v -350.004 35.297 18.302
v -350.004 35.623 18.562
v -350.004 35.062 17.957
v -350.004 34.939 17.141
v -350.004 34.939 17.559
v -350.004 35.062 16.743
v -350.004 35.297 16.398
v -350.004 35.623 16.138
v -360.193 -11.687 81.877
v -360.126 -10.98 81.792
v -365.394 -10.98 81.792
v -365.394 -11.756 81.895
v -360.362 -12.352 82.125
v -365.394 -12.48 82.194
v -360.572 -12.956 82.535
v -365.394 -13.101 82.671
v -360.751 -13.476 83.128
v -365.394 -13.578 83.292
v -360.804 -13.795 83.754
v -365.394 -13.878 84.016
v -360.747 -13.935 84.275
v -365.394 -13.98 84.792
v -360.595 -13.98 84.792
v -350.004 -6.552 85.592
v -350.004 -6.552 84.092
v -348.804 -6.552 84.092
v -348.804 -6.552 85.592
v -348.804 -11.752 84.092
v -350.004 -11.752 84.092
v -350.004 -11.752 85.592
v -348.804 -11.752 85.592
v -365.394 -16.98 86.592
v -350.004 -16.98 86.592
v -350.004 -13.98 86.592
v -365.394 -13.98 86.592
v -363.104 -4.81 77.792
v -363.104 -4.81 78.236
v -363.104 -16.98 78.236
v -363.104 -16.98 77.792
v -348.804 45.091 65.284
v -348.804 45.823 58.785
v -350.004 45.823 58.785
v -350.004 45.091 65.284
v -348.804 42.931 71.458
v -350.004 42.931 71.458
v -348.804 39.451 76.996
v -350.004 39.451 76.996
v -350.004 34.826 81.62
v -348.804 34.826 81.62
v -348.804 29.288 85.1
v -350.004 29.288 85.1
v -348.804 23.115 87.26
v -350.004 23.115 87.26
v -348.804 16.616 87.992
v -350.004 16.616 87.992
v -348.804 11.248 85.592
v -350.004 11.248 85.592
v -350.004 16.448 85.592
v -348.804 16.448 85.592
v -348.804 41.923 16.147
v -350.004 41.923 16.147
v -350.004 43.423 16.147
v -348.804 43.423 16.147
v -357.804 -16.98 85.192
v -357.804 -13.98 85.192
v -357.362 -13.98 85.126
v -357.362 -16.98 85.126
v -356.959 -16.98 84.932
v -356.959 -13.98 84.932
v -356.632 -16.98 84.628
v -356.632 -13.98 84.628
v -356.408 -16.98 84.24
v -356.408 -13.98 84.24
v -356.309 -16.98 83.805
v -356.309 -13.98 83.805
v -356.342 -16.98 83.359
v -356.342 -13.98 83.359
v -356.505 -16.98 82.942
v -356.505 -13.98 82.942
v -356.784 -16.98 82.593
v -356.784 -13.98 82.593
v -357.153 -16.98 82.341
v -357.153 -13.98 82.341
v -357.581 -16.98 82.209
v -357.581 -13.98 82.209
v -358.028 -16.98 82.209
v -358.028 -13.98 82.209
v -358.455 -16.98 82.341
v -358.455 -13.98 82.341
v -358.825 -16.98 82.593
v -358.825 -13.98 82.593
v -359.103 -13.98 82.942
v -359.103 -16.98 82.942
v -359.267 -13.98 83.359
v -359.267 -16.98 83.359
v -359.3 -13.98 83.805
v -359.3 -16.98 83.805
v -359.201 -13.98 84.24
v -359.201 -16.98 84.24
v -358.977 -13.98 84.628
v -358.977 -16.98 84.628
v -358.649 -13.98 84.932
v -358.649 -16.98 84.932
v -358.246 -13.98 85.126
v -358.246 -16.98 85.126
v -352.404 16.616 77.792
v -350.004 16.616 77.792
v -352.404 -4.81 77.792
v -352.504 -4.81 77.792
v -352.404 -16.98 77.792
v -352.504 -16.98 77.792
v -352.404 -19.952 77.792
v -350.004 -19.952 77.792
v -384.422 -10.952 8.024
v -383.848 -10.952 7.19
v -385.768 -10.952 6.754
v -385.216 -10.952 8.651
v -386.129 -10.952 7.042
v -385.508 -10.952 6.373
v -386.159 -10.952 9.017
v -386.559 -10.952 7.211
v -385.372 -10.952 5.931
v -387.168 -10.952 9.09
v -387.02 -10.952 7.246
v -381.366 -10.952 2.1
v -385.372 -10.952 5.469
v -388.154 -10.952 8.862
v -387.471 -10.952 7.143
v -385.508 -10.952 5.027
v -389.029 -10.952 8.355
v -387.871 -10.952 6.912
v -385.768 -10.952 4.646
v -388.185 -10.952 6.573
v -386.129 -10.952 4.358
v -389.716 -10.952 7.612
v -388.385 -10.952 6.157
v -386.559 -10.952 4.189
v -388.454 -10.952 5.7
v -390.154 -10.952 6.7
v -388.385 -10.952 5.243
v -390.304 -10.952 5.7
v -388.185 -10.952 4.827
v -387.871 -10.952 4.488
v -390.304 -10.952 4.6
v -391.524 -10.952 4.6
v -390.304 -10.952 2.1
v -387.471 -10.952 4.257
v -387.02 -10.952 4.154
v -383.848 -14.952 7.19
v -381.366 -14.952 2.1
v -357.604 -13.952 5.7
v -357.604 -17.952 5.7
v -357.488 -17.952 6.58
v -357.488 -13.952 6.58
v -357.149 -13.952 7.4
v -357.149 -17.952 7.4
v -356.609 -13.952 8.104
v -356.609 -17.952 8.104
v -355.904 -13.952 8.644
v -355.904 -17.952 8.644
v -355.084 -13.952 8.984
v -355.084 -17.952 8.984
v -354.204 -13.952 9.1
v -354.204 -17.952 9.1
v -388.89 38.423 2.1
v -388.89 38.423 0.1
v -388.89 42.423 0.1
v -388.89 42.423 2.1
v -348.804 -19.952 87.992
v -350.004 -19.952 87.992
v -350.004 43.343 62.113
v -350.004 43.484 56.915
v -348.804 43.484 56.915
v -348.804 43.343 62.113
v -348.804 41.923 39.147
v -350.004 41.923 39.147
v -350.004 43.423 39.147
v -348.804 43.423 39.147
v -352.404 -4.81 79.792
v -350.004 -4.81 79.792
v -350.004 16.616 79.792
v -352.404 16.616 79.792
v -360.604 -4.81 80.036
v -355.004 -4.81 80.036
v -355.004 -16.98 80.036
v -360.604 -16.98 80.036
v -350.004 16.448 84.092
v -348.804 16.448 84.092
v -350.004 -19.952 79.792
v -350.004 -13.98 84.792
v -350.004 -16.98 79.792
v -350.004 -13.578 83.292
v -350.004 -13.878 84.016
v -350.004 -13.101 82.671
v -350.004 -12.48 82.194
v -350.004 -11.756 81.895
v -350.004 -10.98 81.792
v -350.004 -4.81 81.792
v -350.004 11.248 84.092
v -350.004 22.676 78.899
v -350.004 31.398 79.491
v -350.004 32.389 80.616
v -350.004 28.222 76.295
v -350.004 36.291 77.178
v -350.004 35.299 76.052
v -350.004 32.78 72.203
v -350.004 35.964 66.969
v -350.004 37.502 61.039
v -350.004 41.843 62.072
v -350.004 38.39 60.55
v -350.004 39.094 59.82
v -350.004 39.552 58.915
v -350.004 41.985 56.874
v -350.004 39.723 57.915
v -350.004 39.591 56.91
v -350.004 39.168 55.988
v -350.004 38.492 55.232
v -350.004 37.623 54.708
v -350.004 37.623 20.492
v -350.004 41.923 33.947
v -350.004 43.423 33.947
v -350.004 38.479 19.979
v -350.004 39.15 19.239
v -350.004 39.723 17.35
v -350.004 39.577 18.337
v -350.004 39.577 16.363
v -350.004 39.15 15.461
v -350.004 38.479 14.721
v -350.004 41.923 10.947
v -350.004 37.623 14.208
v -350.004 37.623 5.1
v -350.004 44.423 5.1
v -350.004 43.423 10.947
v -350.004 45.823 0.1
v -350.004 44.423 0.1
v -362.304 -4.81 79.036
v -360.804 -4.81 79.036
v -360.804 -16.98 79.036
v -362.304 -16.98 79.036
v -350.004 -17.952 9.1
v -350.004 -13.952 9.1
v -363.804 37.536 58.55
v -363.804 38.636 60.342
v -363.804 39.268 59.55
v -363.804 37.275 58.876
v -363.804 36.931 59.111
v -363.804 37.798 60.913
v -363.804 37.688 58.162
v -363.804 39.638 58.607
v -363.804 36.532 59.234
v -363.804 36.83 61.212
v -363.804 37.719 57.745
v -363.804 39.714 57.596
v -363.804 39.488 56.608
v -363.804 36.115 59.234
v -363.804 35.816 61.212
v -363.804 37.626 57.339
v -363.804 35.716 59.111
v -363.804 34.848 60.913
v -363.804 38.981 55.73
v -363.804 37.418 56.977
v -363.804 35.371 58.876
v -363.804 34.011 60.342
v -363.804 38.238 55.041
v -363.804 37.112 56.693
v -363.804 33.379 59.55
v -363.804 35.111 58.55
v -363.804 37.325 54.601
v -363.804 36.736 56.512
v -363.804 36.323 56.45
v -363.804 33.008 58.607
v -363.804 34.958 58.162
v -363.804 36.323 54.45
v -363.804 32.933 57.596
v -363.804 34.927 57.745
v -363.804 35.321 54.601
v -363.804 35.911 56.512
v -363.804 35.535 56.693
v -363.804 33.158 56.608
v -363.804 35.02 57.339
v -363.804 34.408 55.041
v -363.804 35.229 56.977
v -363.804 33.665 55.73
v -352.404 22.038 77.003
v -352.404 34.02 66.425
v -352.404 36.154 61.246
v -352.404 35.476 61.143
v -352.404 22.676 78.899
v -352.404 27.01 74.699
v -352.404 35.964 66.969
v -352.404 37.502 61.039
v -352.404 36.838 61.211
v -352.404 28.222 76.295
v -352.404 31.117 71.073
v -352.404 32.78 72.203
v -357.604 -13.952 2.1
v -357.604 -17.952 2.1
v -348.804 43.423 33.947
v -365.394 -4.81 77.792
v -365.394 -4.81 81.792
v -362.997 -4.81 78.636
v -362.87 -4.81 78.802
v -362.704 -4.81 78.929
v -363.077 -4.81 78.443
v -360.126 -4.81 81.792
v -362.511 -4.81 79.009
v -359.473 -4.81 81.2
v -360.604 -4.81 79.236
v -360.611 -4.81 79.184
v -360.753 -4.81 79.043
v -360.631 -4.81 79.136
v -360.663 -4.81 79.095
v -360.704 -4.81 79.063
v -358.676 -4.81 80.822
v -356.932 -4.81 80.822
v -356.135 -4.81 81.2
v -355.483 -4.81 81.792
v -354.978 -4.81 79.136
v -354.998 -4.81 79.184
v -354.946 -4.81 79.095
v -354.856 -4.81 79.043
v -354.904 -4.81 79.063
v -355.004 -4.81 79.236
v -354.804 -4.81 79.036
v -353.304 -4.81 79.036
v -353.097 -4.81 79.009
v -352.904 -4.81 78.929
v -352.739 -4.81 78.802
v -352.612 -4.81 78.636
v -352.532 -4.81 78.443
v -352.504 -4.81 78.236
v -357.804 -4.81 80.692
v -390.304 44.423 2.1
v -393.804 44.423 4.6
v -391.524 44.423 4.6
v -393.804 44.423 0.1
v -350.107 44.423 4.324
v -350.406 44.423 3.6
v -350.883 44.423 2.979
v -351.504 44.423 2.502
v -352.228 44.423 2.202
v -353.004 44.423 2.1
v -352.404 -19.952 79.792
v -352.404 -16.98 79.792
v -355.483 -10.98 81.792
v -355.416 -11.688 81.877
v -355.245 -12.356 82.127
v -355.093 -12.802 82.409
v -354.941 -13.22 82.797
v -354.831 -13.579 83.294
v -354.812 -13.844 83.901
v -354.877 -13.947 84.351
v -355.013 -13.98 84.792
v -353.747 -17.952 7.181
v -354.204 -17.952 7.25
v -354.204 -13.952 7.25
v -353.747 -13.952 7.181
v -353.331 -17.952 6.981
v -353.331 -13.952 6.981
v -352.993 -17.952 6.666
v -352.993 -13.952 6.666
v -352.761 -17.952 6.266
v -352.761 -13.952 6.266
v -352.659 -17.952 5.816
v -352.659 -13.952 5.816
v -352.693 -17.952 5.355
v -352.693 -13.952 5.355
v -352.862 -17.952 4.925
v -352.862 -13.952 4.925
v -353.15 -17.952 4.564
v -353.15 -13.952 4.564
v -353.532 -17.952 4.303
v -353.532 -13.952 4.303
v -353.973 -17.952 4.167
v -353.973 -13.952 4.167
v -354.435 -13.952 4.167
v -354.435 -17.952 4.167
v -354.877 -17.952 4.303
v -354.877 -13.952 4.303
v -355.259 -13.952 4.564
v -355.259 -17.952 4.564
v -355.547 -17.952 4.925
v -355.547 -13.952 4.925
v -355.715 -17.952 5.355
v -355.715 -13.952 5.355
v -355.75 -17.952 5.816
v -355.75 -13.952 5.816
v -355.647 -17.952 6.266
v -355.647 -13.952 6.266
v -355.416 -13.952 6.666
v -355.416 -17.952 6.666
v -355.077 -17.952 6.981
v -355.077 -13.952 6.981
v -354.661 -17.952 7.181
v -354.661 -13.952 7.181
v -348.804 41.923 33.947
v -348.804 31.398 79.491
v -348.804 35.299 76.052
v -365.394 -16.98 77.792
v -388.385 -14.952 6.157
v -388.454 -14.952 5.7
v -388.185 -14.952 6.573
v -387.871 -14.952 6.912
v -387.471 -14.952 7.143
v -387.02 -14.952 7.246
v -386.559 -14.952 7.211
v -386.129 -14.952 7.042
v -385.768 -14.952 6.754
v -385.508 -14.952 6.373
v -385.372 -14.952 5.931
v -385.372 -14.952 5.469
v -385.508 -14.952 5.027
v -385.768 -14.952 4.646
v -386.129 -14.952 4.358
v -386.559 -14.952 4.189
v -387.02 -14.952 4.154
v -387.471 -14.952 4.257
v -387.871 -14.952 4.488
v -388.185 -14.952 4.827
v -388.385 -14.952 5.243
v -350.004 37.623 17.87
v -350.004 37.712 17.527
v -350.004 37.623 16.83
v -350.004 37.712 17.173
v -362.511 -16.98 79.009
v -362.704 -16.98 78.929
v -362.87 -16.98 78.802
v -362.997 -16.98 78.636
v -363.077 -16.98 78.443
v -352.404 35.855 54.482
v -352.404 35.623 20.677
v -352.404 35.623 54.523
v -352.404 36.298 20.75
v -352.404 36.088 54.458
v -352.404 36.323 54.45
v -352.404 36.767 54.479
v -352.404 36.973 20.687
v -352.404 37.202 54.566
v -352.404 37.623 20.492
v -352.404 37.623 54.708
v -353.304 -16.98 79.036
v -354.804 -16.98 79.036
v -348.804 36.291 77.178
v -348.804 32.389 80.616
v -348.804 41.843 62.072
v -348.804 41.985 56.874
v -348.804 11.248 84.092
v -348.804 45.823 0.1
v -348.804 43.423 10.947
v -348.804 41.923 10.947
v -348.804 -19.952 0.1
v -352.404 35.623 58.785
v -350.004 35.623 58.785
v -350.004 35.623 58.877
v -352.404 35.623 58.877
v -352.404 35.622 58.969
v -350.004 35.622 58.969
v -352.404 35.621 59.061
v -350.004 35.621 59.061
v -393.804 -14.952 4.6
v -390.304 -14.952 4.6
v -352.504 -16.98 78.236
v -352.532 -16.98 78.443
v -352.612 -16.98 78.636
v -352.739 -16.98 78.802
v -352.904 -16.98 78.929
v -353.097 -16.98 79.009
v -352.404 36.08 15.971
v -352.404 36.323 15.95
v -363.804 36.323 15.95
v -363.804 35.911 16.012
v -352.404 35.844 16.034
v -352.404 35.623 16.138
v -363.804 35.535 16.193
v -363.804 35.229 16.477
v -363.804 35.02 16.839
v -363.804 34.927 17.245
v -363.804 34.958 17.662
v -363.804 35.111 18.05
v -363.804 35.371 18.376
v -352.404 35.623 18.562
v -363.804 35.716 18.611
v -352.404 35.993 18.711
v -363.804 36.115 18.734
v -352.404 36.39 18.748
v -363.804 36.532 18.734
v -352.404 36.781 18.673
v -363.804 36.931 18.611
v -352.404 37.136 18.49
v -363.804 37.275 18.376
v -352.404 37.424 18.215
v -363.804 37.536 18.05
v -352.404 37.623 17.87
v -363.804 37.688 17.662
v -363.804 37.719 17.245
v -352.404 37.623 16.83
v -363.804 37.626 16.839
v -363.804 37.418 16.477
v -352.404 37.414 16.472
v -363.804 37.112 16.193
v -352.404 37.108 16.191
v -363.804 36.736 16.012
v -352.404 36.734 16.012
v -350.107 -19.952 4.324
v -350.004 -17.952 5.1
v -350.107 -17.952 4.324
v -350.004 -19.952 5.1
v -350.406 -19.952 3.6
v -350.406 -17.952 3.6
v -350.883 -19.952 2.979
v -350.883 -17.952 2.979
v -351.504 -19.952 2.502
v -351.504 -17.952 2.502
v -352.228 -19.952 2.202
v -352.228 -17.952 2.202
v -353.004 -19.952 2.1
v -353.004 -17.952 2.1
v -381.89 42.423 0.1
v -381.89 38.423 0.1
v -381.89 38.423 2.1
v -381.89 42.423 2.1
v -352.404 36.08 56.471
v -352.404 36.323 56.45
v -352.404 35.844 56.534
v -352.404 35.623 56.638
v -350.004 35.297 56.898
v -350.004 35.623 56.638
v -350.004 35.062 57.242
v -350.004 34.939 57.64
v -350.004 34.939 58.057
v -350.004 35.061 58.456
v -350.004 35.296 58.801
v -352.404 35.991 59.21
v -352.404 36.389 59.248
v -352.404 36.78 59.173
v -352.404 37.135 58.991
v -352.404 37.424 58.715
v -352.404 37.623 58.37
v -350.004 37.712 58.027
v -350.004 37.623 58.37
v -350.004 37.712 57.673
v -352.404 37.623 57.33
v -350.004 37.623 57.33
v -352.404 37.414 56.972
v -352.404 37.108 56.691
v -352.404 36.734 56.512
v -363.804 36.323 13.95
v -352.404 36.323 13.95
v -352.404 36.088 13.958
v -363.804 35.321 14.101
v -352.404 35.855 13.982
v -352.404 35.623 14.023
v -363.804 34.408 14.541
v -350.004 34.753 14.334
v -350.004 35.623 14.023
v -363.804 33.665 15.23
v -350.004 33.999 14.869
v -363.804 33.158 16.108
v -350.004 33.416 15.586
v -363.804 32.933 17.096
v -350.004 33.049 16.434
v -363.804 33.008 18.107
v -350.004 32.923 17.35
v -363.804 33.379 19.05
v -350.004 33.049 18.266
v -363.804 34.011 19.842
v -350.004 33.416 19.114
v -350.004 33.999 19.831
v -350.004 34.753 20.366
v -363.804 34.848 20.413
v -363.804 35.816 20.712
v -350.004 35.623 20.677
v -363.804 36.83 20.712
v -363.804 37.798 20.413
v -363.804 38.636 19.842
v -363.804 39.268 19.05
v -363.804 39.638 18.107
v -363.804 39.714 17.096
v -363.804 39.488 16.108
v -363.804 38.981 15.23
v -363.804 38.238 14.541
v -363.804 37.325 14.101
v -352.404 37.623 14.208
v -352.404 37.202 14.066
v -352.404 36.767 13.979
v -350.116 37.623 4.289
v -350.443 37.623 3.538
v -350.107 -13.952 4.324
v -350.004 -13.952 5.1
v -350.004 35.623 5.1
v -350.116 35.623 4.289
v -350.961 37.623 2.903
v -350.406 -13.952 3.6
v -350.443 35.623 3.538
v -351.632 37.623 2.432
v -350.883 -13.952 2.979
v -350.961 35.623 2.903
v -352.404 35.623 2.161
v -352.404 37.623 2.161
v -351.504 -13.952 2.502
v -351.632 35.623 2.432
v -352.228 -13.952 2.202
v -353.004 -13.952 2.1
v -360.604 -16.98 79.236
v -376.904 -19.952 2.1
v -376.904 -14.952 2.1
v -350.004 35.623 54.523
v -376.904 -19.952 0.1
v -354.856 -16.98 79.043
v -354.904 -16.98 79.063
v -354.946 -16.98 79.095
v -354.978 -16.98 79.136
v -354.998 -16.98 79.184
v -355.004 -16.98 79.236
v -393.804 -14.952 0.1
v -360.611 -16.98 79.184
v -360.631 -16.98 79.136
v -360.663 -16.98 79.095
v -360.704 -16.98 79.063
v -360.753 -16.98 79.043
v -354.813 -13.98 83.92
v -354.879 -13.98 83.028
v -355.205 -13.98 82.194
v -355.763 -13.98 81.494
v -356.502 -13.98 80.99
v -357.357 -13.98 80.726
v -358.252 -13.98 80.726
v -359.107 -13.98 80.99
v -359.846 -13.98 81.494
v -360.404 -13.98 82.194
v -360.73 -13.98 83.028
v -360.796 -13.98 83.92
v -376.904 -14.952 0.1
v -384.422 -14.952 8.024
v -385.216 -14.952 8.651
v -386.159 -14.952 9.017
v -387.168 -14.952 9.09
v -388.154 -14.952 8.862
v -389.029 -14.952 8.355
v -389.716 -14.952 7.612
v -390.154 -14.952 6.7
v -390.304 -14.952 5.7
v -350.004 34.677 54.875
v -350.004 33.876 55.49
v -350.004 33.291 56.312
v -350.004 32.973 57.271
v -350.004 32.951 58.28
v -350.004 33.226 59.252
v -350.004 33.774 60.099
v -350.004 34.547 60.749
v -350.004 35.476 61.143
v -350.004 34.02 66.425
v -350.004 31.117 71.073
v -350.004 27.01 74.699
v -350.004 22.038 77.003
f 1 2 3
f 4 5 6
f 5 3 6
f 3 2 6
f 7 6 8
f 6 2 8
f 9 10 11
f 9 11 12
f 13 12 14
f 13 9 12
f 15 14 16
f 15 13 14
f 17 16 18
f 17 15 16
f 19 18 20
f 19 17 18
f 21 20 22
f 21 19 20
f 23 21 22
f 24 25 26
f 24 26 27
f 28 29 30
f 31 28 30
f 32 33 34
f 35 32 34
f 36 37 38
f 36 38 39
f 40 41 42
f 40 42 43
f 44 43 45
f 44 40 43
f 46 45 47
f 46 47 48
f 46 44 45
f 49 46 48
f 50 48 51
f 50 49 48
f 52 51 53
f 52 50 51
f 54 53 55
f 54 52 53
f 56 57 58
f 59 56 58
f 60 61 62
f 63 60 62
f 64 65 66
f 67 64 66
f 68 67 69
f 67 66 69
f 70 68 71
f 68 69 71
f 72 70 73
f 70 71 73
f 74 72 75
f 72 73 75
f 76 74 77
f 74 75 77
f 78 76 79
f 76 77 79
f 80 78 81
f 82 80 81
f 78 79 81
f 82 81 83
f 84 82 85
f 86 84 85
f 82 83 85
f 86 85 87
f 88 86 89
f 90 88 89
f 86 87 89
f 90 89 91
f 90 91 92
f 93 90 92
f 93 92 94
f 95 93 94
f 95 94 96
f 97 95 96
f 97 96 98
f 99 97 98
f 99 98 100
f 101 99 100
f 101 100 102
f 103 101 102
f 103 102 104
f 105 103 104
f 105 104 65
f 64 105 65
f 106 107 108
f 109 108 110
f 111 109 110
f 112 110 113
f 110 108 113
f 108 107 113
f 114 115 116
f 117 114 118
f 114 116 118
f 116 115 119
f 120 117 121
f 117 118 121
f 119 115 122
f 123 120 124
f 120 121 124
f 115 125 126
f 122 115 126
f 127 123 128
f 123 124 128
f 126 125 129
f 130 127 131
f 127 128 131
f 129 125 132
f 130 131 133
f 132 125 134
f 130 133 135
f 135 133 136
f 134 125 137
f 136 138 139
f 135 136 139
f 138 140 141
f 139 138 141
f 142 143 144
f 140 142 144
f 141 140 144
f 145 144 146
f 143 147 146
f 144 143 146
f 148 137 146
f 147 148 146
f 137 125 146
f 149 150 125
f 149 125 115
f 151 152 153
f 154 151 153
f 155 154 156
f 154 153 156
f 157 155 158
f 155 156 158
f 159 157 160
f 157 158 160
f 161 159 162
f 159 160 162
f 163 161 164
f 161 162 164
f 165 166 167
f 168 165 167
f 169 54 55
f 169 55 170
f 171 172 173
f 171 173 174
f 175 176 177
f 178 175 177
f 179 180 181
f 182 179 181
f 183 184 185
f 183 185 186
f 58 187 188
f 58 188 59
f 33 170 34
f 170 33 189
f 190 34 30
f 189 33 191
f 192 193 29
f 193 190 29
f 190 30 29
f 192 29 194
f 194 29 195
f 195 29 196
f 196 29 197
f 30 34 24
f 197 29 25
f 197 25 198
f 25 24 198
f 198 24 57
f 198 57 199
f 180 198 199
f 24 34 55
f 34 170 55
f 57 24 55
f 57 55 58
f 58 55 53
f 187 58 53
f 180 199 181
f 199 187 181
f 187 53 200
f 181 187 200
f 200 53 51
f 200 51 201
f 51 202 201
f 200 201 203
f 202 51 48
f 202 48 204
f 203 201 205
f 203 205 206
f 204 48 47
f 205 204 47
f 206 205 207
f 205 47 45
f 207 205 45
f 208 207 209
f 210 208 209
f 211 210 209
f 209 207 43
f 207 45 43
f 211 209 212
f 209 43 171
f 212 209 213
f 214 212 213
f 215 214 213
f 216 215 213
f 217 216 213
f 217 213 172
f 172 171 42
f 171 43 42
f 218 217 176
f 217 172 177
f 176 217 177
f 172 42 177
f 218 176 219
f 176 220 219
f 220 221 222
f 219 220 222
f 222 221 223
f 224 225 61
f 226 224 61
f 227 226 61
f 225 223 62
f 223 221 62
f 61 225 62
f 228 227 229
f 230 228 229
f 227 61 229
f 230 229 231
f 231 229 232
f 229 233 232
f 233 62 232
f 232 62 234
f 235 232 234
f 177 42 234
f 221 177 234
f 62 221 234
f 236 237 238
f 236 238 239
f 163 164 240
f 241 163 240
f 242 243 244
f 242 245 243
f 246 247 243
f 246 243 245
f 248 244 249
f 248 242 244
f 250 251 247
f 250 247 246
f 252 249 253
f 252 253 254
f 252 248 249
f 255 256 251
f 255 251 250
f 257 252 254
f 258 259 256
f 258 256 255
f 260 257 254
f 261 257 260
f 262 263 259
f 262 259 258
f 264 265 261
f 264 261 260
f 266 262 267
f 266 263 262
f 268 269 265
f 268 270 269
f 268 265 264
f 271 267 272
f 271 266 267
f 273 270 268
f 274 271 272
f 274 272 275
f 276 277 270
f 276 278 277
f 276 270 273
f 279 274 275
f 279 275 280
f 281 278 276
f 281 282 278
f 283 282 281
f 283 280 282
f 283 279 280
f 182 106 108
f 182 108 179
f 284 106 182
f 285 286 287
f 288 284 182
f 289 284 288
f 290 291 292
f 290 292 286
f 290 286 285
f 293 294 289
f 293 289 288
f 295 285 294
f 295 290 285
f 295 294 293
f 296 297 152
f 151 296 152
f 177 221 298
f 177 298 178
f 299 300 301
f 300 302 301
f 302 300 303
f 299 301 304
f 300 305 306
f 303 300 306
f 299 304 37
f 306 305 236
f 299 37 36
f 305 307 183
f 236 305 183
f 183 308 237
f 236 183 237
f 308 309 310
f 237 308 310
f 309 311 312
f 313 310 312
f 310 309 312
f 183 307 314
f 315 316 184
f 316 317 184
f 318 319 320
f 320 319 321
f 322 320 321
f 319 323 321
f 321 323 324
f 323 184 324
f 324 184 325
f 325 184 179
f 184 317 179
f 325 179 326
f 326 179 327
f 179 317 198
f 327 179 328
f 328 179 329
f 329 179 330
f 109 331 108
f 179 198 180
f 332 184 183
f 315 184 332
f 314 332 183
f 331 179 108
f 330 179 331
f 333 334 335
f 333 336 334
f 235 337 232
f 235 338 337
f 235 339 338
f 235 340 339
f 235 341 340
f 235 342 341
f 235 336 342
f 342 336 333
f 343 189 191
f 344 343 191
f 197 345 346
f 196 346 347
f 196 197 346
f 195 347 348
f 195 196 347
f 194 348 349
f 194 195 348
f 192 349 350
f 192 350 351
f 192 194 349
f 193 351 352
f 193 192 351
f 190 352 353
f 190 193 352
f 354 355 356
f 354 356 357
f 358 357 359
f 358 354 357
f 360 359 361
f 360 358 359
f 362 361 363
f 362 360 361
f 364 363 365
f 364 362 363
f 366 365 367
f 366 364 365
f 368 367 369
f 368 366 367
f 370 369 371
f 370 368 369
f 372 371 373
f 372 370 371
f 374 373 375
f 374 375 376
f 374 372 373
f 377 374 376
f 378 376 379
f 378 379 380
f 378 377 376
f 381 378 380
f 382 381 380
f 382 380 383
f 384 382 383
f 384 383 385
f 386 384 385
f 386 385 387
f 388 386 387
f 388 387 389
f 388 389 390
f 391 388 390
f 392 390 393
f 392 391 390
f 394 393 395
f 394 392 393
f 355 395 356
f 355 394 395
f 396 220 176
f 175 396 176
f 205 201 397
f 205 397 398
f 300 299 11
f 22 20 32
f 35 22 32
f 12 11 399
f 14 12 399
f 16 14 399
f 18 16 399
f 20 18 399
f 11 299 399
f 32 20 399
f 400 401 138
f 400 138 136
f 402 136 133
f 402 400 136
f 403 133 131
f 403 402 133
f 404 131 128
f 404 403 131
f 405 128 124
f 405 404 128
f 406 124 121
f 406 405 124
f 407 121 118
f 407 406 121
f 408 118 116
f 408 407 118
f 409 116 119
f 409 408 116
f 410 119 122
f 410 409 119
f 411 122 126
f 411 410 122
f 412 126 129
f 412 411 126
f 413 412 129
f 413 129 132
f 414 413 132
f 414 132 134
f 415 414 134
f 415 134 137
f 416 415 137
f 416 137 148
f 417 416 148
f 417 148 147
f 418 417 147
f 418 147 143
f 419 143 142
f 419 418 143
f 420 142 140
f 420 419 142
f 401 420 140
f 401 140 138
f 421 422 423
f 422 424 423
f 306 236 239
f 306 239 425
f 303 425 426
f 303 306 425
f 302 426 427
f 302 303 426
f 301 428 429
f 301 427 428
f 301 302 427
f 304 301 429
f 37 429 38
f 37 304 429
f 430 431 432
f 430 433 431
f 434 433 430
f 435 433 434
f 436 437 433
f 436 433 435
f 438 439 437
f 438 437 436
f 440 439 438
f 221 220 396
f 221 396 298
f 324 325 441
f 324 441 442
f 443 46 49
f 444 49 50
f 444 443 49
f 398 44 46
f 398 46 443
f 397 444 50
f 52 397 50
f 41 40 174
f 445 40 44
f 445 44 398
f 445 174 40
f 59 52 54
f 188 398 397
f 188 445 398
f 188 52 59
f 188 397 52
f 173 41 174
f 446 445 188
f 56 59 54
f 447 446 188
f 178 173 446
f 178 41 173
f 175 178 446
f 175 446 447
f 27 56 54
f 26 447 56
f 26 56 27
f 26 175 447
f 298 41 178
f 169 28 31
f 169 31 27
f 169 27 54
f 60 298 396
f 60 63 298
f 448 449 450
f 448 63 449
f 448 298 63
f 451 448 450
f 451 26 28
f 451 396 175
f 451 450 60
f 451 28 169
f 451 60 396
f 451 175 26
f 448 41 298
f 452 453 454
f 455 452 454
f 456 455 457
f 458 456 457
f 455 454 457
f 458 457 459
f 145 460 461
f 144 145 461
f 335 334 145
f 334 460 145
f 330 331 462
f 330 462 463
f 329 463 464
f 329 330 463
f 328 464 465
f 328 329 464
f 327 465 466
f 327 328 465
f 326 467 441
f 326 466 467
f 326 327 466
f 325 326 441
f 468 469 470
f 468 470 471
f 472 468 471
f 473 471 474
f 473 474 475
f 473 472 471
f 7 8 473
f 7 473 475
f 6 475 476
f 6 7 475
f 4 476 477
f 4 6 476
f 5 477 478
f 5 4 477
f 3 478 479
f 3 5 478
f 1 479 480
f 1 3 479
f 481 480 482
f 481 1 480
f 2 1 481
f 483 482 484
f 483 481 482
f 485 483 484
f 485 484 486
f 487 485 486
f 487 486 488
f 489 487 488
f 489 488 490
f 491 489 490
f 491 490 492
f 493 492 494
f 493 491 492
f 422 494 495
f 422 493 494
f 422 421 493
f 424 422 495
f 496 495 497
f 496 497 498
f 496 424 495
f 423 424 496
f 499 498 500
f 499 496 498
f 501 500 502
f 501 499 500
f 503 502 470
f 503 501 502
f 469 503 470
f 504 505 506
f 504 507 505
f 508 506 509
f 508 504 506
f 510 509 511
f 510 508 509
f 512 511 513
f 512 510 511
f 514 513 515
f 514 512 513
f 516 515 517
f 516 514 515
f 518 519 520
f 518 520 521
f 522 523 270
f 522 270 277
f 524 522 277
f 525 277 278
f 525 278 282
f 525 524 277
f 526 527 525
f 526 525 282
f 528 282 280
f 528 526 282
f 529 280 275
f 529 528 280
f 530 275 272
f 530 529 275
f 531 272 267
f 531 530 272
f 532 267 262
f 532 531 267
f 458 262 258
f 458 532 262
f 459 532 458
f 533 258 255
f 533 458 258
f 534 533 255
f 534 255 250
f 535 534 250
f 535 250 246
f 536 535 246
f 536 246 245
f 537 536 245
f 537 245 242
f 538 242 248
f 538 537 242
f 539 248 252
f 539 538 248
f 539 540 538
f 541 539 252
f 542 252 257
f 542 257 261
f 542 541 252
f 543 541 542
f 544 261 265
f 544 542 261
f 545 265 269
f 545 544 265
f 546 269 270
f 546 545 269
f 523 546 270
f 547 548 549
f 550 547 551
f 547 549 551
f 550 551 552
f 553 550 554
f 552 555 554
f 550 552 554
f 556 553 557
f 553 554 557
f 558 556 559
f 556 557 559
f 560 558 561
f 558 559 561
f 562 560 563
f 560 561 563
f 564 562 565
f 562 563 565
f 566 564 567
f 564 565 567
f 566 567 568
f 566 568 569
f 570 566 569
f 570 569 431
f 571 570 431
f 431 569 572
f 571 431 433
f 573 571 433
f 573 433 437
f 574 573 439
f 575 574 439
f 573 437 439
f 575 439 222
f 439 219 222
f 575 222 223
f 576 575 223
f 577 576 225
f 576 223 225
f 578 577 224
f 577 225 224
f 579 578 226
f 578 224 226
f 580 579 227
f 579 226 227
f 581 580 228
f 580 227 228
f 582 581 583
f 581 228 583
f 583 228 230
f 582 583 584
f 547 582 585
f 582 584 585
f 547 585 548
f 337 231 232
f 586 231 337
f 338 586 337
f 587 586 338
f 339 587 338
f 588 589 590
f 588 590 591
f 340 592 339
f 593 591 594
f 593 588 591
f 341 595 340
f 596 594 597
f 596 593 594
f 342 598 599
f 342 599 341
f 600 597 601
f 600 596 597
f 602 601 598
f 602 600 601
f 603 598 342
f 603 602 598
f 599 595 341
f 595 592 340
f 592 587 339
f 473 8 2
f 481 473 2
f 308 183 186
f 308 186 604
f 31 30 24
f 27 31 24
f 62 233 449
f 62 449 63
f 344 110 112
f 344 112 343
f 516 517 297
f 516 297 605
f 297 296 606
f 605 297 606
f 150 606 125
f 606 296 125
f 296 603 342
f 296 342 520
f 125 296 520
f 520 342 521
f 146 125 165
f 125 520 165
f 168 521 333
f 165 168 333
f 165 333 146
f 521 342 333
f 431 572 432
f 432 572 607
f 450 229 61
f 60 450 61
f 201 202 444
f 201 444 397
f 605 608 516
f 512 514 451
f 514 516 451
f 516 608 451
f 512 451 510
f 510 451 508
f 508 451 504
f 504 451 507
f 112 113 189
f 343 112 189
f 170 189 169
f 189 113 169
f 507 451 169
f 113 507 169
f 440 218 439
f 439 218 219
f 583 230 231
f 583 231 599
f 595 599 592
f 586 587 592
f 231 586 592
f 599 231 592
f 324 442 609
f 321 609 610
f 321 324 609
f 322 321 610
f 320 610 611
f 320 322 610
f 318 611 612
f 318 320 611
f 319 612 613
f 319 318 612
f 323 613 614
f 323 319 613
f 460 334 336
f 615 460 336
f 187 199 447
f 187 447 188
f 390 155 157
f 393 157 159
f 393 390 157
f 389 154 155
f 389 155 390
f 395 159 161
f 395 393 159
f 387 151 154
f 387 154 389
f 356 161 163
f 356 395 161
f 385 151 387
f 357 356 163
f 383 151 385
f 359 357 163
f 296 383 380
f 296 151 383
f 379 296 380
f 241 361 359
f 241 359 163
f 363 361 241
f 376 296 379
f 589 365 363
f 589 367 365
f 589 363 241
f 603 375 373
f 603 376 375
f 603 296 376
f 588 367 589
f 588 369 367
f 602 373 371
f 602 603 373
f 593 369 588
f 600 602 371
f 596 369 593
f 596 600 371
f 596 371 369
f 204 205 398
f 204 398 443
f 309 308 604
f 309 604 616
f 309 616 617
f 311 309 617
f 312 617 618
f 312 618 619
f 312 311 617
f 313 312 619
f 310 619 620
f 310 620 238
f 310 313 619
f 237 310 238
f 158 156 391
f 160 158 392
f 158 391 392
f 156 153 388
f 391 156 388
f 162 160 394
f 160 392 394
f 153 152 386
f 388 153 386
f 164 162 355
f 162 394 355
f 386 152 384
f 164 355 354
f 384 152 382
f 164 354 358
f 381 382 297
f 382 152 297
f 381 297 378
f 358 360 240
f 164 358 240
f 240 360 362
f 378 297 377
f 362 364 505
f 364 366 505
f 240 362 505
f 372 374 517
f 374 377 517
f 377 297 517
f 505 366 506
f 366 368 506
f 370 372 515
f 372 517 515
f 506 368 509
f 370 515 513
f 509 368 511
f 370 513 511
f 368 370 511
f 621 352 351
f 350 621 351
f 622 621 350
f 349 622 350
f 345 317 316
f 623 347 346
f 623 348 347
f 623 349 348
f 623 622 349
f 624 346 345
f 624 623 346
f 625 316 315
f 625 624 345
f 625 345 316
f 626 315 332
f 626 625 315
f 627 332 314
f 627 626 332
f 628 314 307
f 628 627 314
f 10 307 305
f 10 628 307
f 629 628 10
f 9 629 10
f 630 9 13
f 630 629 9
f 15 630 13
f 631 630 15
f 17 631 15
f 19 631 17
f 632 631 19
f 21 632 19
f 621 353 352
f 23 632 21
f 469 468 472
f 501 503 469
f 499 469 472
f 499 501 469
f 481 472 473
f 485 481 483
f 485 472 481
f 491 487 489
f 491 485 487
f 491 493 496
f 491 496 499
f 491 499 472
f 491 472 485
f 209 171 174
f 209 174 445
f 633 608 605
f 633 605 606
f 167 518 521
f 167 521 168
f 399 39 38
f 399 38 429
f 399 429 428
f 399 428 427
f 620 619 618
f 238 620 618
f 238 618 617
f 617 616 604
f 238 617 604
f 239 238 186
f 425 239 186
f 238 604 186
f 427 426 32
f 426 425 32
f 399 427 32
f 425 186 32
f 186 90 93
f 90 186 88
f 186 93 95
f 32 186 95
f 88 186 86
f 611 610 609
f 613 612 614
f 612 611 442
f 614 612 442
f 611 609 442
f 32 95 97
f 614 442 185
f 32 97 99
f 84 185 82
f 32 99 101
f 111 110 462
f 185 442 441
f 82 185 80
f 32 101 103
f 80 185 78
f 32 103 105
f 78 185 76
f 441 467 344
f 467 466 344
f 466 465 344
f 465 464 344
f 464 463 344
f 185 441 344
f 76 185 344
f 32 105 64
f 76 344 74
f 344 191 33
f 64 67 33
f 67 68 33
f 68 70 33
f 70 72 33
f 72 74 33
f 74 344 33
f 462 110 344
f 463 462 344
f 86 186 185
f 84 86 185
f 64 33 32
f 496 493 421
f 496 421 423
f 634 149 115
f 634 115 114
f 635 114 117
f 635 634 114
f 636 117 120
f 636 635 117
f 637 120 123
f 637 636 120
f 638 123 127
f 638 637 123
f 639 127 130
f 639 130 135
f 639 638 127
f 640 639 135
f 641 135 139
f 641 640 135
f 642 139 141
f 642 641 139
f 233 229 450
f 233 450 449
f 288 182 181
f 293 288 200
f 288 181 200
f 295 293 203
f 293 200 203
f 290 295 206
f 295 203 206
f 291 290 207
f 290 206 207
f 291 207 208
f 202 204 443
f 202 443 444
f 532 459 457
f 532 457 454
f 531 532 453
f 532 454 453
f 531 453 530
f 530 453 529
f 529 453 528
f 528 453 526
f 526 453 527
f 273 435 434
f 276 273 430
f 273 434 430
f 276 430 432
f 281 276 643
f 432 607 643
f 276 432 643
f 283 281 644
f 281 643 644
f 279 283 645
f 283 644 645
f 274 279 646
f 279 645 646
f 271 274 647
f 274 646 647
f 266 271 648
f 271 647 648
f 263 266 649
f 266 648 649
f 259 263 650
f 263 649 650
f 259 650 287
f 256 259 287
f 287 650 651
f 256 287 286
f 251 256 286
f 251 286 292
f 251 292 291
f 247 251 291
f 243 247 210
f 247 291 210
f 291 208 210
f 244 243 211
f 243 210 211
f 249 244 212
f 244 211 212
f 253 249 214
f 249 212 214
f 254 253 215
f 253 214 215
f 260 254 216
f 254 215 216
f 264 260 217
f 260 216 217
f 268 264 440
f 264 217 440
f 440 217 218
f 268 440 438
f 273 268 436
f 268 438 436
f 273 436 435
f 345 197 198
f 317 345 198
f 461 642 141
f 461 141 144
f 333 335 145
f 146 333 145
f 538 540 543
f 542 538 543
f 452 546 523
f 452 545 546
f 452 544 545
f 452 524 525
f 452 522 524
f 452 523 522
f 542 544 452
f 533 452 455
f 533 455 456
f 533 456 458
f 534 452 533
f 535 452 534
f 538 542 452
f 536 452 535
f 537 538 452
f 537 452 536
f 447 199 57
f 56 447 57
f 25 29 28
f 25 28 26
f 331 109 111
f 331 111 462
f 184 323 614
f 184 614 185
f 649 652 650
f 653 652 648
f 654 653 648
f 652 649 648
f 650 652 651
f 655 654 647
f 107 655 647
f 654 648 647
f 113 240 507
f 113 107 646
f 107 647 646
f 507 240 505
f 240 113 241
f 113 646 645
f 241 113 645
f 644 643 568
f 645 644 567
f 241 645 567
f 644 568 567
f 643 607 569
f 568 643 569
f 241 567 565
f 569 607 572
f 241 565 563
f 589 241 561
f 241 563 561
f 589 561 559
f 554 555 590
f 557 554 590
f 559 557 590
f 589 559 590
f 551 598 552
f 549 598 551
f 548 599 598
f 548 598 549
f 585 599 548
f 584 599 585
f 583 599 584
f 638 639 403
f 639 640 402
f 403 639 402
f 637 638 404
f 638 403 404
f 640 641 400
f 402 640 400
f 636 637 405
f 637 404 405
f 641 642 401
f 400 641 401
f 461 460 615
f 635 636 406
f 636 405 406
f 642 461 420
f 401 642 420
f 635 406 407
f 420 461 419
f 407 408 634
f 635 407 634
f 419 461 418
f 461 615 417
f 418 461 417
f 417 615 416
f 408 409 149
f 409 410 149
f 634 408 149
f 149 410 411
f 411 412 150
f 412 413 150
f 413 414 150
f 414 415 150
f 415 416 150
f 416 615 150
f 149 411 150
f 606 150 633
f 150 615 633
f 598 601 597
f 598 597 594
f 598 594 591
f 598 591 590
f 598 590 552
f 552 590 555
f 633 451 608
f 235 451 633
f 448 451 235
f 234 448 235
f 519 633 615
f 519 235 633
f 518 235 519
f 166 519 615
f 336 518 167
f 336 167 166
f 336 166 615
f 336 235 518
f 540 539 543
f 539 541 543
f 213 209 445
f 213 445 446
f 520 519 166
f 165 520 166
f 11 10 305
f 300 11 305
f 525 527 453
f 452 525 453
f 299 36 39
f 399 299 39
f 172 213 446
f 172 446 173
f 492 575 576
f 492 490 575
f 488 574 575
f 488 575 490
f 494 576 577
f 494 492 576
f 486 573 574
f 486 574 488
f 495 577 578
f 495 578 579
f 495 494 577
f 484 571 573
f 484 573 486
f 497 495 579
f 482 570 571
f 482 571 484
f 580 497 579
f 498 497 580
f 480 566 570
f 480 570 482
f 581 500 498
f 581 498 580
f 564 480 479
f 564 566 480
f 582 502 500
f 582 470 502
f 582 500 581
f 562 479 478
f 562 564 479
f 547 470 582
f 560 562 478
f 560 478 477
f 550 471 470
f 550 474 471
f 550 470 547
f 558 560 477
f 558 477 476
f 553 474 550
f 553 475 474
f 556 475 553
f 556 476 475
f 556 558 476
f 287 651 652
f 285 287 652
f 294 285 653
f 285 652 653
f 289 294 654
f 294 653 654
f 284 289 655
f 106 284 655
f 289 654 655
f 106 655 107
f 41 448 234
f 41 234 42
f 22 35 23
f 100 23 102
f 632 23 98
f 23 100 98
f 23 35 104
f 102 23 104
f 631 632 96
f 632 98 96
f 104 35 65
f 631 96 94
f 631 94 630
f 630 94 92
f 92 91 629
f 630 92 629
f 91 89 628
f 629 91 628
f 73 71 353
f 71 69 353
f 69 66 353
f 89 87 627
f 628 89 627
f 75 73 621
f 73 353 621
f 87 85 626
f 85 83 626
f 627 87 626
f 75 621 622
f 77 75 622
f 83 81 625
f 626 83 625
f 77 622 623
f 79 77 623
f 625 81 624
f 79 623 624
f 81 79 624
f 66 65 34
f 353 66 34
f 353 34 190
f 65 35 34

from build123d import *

# Parameters (mm, degrees)
EXTRUDE_1_DEPTH     = 2
EXTRUDE_2_DEPTH     = 1.2
SKETCH_4_R          = 1.55
EXTRUDE_3_DEPTH     = 4
EXTRUDE_START       = 3
SKETCH_4_3_R        = 1.55
EXTRUDE_4_DEPTH     = 4
FILLET_1_R          = 3
SKETCH_5_W          = 3.5
SKETCH_5_H          = 2.5
EXTRUDE_5_DEPTH     = 59.375418161
SKETCH_9_W          = 7
SKETCH_9_H          = 4
CUT_EXTRUDE_3_DEPTH = 2
OTHER_START         = -350.004341608
OTHER_1_OUTLINE_W   = 1.5
OTHER_1_OUTLINE_H   = 5.2
OTHER_1_OUTLINE_W_2 = 5.2
OTHER_1_OUTLINE_H_2 = 1.5
OTHER_1_DEPTH       = 1.2
SKETCH_10_R         = 3.4
SKETCH_10_R_2       = 1.4
EXTRUDE_6_DEPTH     = 13.8
EXTRUDE_7_DEPTH     = 2.4
CHAMFER_1_SIZE2     = 1.219331471
CHAMFER_1_SIZE      = 2.5
EXTRUDE_9_DEPTH     = 15.389983971
SKETCH_15_R         = 1.5
CUT_EXTRUDE_4_DEPTH = 407.679532375
FILLET_2_R          = 3
SKETCH_16_R         = 3
CUT_EXTRUDE_5_DEPTH = 408.922716855


# Read off the part's stored shape, not the designer's step: Отступ1
# Some blends are built 0.0001 mm under size
with BuildPart() as part:
    # Эскиз2 → Бобышка-Вытянуть1 (new body)
    with BuildSketch(Plane.XY.offset(0.1)):
        Polygon((-376.904341608, -14.952219826), (-393.804341608, -14.952219826), (-393.804341608, 44.423198335), (-348.804341608, 44.423198335), (-348.804341608, -19.952219826), (-376.904341608, -19.952219826), align=None)
    extrude(amount=EXTRUDE_1_DEPTH)

    # Эскиз3 → Бобышка-Вытянуть2 (add)
    with BuildSketch(Plane(origin=(-348.804341608, 0, 0), x_dir=(0, 0, -1), z_dir=(1, 0, 0))):
        with BuildLine():
            Line((-0.1, -19.952219826), (-0.1, 45.823198335))
            Line((-0.1, 45.823198335), (-58.7849644, 45.823198335))
            ThreePointArc((-58.7849644, 45.823198335), (-79.43775717, 37.268531468), (-87.992424037, 16.615738698))
            Line((-87.992424037, 16.615738698), (-87.992424037, -19.952219826))
            Line((-87.992424037, -19.952219826), (-0.1, -19.952219826))
        make_face()
    extrude(amount=-EXTRUDE_2_DEPTH)

    # Эскиз4 → Бобышка-Вытянуть3 (add)
    with BuildSketch(Plane(origin=(0, -17.952219826, 0), x_dir=(1, 0, 0), z_dir=(0, 1, 0))):
        with BuildLine():
            Line((-357.604341608, -2.1), (-357.604341608, -5.7))
            ThreePointArc((-357.604341608, -5.7), (-356.608504664, -8.104163056), (-354.204341608, -9.1))
            Line((-354.204341608, -9.1), (-350.004341608, -9.1))
            Line((-350.004341608, -9.1), (-350.004341608, -2.1))
            Line((-350.004341608, -2.1), (-357.604341608, -2.1))
        make_face()
        with Locations(Location((-354.204341608, -5.7, 0), (0, 0, 270))):
            Circle(SKETCH_4_R, mode=Mode.SUBTRACT)
    extrude(amount=EXTRUDE_3_DEPTH)

    # Эскиз4<3> → Бобышка-Вытянуть4 (add)
    with BuildSketch(Plane(origin=(0, -17.952219826, 0), x_dir=(1, 0, 0), z_dir=(0, 1, 0)).offset(EXTRUDE_START)):
        with BuildLine():
            Line((-390.304341608, -5.7), (-390.304341608, -2.1))
            Line((-390.304341608, -2.1), (-381.365657691, -2.1))
            Line((-381.365657691, -2.1), (-383.84844185, -7.190461899))
            ThreePointArc((-383.84844185, -7.190461899), (-387.669175192, -9.01285822), (-390.304341608, -5.7))
        make_face()
        with Locations(Location((-386.904341608, -5.7, 0), (0, 0, 180))):
            Circle(SKETCH_4_3_R, mode=Mode.SUBTRACT)
    extrude(amount=EXTRUDE_4_DEPTH)

    # Скругление1
    fillet_1_edges = [part.edges().sort_by_distance(p)[0] for p in [
        (-350.004341608, -18.952219826, 2.1),
        (-350.004341608, 15.235489254, 2.1),
    ]]
    fillet(fillet_1_edges, radius=FILLET_1_R)

    # Эскиз5 → Бобышка-Вытянуть5 (add)
    with BuildSketch(Plane(origin=(0, 44.423198335, 0), x_dir=(1, 0, 0), z_dir=(0, 1, 0))):
        with Locations((-392.054341608, -3.35)):
            Rectangle(SKETCH_5_W, SKETCH_5_H)
    extrude(amount=-EXTRUDE_5_DEPTH)

    # Эскиз9 → Вырез-Вытянуть3 (cut)
    with BuildSketch(Plane(origin=(0, 0, 0.1), x_dir=(-1, 0, 0), z_dir=(0, 0, -1))):
        with Locations((385.390488384, 40.423198335)):
            Rectangle(SKETCH_9_W, SKETCH_9_H)
    extrude(amount=-CUT_EXTRUDE_3_DEPTH, mode=Mode.SUBTRACT)

    # Отступ1 outline → Отступ1 (cut)
    with BuildSketch(Plane.YZ.offset(OTHER_START)):
        with Locations((42.673198335, 13.546937644)):
            Rectangle(OTHER_1_OUTLINE_W, OTHER_1_OUTLINE_H)
        with Locations((42.673198335, 36.546937644)):
            Rectangle(OTHER_1_OUTLINE_W, OTHER_1_OUTLINE_H)
        Polygon((41.843105902, 62.072434127), (41.984560077, 56.874358452), (43.484004983, 56.915162541), (43.342550808, 62.113238216), align=None)
        Polygon((31.397725301, 79.490528515), (35.298941914, 76.052431812), (36.290700579, 77.177782758), (32.389483966, 80.615879461), align=None)
        with Locations((13.847780174, 84.842424037)):
            Rectangle(OTHER_1_OUTLINE_W_2, OTHER_1_OUTLINE_H_2)
        with Locations((-9.152219826, 84.842424037)):
            Rectangle(OTHER_1_OUTLINE_W_2, OTHER_1_OUTLINE_H_2)
    extrude(amount=OTHER_1_DEPTH, mode=Mode.SUBTRACT)

    # Эскиз10 → Бобышка-Вытянуть6 (add)
    # profile 1 of 2: a face of its own
    with BuildSketch(Plane.ZY.offset(350.004341608)):
        with Locations(Location((57.85, 36.323198334, 0), (0, 0, 180))):
            Circle(SKETCH_10_R)
        with Locations(Location((57.85, 36.323198334, 0), (0, 0, 180))):
            Circle(SKETCH_10_R_2, mode=Mode.SUBTRACT)
    # profile 2 of 2: a face of its own
    with BuildSketch(Plane.ZY.offset(350.004341608)):
        with Locations(Location((17.35, 36.323198334, 0), (0, 0, 180))):
            Circle(SKETCH_10_R)
        with Locations(Location((17.35, 36.323198334, 0), (0, 0, 180))):
            Circle(SKETCH_10_R_2, mode=Mode.SUBTRACT)
    extrude(amount=EXTRUDE_6_DEPTH)

    # Эскиз12 → Бобышка-Вытянуть7 (add)
    with BuildSketch(Plane.ZY.offset(350.004341608)):
        with BuildLine():
            Line((77.792424037, 16.615738698), (77.792424037, -19.952219826))
            Line((77.792424037, -19.952219826), (79.792424037, -19.952219826))
            Line((79.792424037, -19.952219826), (79.792424037, 16.615738698))
            ThreePointArc((79.792424037, 16.615738698), (73.639481564, 31.470255863), (58.7849644, 37.623198335))
            Line((58.7849644, 37.623198335), (0.1, 37.623198335))
            Line((0.1, 37.623198335), (0.1, 35.623198335))
            Line((0.1, 35.623198335), (58.7849644, 35.623198335))
            ThreePointArc((58.7849644, 35.623198335), (72.225268002, 30.0560423), (77.792424037, 16.615738698))
        make_face()
    extrude(amount=EXTRUDE_7_DEPTH)

    # Фаска1
    chamfer_1_edges = [part.edges().sort_by_distance(p)[0] for p in [
        (-390.304341608, 16.735489254, 4.6),
    ]]
    chamfer_1_side = [part.faces().sort_by_distance(p)[0] for p in [
        (-390.304341608, 16.735489254, 4.575613371),
    ]]
    chamfer(chamfer_1_edges, length=CHAMFER_1_SIZE - 0.0001, length2=CHAMFER_1_SIZE2 - 0.0001, reference=chamfer_1_side[0])  # a hair under: the kernel refuses the full size

    # Эскиз14 → Бобышка-Вытянуть9 (add)
    with BuildSketch(Plane.ZY.offset(350.004341608)):
        Polygon((77.792424037, -16.979951829), (86.592424037, -16.979951829), (86.592424037, -13.979951829), (81.792424037, -13.979951829), (81.792424037, -4.809951829), (77.792424037, -4.809951829), align=None)
    extrude(amount=EXTRUDE_9_DEPTH)

    # Эскиз15 → Вырез-Вытянуть4 (cut, through all)
    with BuildSketch(Plane(origin=(0, -4.809951829, 0), x_dir=(1, 0, 0), z_dir=(0, 1, 0))):
        with Locations(Location((-357.804325578, -83.692424037, 0), (0, 0, 270))):
            Circle(SKETCH_15_R)
        with BuildLine():
            Line((-363.104325578, -78.236115217), (-363.104325578, -76.736115217))
            Line((-363.104325578, -76.736115217), (-352.504325578, -76.736115217))
            Line((-352.504325578, -76.736115217), (-352.504325578, -78.236115217))
            ThreePointArc((-352.504325578, -78.236115217), (-352.738640153, -78.801800642), (-353.304325578, -79.036115217))
            Line((-353.304325578, -79.036115217), (-354.804325578, -79.036115217))
            ThreePointArc((-354.804325578, -79.036115217), (-354.945746935, -79.09469386), (-355.004325578, -79.236115217))
            Line((-355.004325578, -79.236115217), (-355.004325578, -80.036115217))
            Line((-355.004325578, -80.036115217), (-360.604325578, -80.036115217))
            Line((-360.604325578, -80.036115217), (-360.604325578, -79.236115217))
            ThreePointArc((-360.604325578, -79.236115217), (-360.662904222, -79.09469386), (-360.804325578, -79.036115217))
            Line((-360.804325578, -79.036115217), (-362.304325578, -79.036115217))
            ThreePointArc((-362.304325578, -79.036115217), (-362.870011003, -78.801800642), (-363.104325578, -78.236115217))
        make_face()
    extrude(amount=-CUT_EXTRUDE_4_DEPTH, mode=Mode.SUBTRACT)

    # Скругление2
    # the kernel refuses this fillet: 3 mm, written as the material it adds along each edge
    with BuildSketch(Plane(origin=(-350.004341608, -13.979951829, 81.792424037), x_dir=(0, 1, 0), z_dir=(-1, 0, 0))) as fillet_2_piece_1_section:
        with BuildLine():
            CenterArc((FILLET_2_R, -FILLET_2_R), FILLET_2_R, 90, 90)
            Line((0, -FILLET_2_R), (0, 0))
            Line((0, 0), (FILLET_2_R, 0))
        make_face()
    fillet_2_piece_1 = extrude(amount=15.389983971, mode=Mode.PRIVATE)
    fillet_2_piece_1 = fillet_2_piece_1 - Plane(origin=(-357.804325578, -11.764674138, 83.692424037), x_dir=(0, 0, 1), z_dir=(0, 1, 0)) * Cylinder(1.5, 43, mode=Mode.PRIVATE)
    add(fillet_2_piece_1)

    # Эскиз16 → Вырез-Вытянуть5 (cut, through all)
    with BuildSketch(Plane(origin=(0, -13.979951829, 0), x_dir=(1, 0, 0), z_dir=(0, 1, 0))):
        with Locations((-357.804325578, -83.692424037)):
            Circle(SKETCH_16_R)
    extrude(amount=CUT_EXTRUDE_5_DEPTH, mode=Mode.SUBTRACT)


solid = part.part
